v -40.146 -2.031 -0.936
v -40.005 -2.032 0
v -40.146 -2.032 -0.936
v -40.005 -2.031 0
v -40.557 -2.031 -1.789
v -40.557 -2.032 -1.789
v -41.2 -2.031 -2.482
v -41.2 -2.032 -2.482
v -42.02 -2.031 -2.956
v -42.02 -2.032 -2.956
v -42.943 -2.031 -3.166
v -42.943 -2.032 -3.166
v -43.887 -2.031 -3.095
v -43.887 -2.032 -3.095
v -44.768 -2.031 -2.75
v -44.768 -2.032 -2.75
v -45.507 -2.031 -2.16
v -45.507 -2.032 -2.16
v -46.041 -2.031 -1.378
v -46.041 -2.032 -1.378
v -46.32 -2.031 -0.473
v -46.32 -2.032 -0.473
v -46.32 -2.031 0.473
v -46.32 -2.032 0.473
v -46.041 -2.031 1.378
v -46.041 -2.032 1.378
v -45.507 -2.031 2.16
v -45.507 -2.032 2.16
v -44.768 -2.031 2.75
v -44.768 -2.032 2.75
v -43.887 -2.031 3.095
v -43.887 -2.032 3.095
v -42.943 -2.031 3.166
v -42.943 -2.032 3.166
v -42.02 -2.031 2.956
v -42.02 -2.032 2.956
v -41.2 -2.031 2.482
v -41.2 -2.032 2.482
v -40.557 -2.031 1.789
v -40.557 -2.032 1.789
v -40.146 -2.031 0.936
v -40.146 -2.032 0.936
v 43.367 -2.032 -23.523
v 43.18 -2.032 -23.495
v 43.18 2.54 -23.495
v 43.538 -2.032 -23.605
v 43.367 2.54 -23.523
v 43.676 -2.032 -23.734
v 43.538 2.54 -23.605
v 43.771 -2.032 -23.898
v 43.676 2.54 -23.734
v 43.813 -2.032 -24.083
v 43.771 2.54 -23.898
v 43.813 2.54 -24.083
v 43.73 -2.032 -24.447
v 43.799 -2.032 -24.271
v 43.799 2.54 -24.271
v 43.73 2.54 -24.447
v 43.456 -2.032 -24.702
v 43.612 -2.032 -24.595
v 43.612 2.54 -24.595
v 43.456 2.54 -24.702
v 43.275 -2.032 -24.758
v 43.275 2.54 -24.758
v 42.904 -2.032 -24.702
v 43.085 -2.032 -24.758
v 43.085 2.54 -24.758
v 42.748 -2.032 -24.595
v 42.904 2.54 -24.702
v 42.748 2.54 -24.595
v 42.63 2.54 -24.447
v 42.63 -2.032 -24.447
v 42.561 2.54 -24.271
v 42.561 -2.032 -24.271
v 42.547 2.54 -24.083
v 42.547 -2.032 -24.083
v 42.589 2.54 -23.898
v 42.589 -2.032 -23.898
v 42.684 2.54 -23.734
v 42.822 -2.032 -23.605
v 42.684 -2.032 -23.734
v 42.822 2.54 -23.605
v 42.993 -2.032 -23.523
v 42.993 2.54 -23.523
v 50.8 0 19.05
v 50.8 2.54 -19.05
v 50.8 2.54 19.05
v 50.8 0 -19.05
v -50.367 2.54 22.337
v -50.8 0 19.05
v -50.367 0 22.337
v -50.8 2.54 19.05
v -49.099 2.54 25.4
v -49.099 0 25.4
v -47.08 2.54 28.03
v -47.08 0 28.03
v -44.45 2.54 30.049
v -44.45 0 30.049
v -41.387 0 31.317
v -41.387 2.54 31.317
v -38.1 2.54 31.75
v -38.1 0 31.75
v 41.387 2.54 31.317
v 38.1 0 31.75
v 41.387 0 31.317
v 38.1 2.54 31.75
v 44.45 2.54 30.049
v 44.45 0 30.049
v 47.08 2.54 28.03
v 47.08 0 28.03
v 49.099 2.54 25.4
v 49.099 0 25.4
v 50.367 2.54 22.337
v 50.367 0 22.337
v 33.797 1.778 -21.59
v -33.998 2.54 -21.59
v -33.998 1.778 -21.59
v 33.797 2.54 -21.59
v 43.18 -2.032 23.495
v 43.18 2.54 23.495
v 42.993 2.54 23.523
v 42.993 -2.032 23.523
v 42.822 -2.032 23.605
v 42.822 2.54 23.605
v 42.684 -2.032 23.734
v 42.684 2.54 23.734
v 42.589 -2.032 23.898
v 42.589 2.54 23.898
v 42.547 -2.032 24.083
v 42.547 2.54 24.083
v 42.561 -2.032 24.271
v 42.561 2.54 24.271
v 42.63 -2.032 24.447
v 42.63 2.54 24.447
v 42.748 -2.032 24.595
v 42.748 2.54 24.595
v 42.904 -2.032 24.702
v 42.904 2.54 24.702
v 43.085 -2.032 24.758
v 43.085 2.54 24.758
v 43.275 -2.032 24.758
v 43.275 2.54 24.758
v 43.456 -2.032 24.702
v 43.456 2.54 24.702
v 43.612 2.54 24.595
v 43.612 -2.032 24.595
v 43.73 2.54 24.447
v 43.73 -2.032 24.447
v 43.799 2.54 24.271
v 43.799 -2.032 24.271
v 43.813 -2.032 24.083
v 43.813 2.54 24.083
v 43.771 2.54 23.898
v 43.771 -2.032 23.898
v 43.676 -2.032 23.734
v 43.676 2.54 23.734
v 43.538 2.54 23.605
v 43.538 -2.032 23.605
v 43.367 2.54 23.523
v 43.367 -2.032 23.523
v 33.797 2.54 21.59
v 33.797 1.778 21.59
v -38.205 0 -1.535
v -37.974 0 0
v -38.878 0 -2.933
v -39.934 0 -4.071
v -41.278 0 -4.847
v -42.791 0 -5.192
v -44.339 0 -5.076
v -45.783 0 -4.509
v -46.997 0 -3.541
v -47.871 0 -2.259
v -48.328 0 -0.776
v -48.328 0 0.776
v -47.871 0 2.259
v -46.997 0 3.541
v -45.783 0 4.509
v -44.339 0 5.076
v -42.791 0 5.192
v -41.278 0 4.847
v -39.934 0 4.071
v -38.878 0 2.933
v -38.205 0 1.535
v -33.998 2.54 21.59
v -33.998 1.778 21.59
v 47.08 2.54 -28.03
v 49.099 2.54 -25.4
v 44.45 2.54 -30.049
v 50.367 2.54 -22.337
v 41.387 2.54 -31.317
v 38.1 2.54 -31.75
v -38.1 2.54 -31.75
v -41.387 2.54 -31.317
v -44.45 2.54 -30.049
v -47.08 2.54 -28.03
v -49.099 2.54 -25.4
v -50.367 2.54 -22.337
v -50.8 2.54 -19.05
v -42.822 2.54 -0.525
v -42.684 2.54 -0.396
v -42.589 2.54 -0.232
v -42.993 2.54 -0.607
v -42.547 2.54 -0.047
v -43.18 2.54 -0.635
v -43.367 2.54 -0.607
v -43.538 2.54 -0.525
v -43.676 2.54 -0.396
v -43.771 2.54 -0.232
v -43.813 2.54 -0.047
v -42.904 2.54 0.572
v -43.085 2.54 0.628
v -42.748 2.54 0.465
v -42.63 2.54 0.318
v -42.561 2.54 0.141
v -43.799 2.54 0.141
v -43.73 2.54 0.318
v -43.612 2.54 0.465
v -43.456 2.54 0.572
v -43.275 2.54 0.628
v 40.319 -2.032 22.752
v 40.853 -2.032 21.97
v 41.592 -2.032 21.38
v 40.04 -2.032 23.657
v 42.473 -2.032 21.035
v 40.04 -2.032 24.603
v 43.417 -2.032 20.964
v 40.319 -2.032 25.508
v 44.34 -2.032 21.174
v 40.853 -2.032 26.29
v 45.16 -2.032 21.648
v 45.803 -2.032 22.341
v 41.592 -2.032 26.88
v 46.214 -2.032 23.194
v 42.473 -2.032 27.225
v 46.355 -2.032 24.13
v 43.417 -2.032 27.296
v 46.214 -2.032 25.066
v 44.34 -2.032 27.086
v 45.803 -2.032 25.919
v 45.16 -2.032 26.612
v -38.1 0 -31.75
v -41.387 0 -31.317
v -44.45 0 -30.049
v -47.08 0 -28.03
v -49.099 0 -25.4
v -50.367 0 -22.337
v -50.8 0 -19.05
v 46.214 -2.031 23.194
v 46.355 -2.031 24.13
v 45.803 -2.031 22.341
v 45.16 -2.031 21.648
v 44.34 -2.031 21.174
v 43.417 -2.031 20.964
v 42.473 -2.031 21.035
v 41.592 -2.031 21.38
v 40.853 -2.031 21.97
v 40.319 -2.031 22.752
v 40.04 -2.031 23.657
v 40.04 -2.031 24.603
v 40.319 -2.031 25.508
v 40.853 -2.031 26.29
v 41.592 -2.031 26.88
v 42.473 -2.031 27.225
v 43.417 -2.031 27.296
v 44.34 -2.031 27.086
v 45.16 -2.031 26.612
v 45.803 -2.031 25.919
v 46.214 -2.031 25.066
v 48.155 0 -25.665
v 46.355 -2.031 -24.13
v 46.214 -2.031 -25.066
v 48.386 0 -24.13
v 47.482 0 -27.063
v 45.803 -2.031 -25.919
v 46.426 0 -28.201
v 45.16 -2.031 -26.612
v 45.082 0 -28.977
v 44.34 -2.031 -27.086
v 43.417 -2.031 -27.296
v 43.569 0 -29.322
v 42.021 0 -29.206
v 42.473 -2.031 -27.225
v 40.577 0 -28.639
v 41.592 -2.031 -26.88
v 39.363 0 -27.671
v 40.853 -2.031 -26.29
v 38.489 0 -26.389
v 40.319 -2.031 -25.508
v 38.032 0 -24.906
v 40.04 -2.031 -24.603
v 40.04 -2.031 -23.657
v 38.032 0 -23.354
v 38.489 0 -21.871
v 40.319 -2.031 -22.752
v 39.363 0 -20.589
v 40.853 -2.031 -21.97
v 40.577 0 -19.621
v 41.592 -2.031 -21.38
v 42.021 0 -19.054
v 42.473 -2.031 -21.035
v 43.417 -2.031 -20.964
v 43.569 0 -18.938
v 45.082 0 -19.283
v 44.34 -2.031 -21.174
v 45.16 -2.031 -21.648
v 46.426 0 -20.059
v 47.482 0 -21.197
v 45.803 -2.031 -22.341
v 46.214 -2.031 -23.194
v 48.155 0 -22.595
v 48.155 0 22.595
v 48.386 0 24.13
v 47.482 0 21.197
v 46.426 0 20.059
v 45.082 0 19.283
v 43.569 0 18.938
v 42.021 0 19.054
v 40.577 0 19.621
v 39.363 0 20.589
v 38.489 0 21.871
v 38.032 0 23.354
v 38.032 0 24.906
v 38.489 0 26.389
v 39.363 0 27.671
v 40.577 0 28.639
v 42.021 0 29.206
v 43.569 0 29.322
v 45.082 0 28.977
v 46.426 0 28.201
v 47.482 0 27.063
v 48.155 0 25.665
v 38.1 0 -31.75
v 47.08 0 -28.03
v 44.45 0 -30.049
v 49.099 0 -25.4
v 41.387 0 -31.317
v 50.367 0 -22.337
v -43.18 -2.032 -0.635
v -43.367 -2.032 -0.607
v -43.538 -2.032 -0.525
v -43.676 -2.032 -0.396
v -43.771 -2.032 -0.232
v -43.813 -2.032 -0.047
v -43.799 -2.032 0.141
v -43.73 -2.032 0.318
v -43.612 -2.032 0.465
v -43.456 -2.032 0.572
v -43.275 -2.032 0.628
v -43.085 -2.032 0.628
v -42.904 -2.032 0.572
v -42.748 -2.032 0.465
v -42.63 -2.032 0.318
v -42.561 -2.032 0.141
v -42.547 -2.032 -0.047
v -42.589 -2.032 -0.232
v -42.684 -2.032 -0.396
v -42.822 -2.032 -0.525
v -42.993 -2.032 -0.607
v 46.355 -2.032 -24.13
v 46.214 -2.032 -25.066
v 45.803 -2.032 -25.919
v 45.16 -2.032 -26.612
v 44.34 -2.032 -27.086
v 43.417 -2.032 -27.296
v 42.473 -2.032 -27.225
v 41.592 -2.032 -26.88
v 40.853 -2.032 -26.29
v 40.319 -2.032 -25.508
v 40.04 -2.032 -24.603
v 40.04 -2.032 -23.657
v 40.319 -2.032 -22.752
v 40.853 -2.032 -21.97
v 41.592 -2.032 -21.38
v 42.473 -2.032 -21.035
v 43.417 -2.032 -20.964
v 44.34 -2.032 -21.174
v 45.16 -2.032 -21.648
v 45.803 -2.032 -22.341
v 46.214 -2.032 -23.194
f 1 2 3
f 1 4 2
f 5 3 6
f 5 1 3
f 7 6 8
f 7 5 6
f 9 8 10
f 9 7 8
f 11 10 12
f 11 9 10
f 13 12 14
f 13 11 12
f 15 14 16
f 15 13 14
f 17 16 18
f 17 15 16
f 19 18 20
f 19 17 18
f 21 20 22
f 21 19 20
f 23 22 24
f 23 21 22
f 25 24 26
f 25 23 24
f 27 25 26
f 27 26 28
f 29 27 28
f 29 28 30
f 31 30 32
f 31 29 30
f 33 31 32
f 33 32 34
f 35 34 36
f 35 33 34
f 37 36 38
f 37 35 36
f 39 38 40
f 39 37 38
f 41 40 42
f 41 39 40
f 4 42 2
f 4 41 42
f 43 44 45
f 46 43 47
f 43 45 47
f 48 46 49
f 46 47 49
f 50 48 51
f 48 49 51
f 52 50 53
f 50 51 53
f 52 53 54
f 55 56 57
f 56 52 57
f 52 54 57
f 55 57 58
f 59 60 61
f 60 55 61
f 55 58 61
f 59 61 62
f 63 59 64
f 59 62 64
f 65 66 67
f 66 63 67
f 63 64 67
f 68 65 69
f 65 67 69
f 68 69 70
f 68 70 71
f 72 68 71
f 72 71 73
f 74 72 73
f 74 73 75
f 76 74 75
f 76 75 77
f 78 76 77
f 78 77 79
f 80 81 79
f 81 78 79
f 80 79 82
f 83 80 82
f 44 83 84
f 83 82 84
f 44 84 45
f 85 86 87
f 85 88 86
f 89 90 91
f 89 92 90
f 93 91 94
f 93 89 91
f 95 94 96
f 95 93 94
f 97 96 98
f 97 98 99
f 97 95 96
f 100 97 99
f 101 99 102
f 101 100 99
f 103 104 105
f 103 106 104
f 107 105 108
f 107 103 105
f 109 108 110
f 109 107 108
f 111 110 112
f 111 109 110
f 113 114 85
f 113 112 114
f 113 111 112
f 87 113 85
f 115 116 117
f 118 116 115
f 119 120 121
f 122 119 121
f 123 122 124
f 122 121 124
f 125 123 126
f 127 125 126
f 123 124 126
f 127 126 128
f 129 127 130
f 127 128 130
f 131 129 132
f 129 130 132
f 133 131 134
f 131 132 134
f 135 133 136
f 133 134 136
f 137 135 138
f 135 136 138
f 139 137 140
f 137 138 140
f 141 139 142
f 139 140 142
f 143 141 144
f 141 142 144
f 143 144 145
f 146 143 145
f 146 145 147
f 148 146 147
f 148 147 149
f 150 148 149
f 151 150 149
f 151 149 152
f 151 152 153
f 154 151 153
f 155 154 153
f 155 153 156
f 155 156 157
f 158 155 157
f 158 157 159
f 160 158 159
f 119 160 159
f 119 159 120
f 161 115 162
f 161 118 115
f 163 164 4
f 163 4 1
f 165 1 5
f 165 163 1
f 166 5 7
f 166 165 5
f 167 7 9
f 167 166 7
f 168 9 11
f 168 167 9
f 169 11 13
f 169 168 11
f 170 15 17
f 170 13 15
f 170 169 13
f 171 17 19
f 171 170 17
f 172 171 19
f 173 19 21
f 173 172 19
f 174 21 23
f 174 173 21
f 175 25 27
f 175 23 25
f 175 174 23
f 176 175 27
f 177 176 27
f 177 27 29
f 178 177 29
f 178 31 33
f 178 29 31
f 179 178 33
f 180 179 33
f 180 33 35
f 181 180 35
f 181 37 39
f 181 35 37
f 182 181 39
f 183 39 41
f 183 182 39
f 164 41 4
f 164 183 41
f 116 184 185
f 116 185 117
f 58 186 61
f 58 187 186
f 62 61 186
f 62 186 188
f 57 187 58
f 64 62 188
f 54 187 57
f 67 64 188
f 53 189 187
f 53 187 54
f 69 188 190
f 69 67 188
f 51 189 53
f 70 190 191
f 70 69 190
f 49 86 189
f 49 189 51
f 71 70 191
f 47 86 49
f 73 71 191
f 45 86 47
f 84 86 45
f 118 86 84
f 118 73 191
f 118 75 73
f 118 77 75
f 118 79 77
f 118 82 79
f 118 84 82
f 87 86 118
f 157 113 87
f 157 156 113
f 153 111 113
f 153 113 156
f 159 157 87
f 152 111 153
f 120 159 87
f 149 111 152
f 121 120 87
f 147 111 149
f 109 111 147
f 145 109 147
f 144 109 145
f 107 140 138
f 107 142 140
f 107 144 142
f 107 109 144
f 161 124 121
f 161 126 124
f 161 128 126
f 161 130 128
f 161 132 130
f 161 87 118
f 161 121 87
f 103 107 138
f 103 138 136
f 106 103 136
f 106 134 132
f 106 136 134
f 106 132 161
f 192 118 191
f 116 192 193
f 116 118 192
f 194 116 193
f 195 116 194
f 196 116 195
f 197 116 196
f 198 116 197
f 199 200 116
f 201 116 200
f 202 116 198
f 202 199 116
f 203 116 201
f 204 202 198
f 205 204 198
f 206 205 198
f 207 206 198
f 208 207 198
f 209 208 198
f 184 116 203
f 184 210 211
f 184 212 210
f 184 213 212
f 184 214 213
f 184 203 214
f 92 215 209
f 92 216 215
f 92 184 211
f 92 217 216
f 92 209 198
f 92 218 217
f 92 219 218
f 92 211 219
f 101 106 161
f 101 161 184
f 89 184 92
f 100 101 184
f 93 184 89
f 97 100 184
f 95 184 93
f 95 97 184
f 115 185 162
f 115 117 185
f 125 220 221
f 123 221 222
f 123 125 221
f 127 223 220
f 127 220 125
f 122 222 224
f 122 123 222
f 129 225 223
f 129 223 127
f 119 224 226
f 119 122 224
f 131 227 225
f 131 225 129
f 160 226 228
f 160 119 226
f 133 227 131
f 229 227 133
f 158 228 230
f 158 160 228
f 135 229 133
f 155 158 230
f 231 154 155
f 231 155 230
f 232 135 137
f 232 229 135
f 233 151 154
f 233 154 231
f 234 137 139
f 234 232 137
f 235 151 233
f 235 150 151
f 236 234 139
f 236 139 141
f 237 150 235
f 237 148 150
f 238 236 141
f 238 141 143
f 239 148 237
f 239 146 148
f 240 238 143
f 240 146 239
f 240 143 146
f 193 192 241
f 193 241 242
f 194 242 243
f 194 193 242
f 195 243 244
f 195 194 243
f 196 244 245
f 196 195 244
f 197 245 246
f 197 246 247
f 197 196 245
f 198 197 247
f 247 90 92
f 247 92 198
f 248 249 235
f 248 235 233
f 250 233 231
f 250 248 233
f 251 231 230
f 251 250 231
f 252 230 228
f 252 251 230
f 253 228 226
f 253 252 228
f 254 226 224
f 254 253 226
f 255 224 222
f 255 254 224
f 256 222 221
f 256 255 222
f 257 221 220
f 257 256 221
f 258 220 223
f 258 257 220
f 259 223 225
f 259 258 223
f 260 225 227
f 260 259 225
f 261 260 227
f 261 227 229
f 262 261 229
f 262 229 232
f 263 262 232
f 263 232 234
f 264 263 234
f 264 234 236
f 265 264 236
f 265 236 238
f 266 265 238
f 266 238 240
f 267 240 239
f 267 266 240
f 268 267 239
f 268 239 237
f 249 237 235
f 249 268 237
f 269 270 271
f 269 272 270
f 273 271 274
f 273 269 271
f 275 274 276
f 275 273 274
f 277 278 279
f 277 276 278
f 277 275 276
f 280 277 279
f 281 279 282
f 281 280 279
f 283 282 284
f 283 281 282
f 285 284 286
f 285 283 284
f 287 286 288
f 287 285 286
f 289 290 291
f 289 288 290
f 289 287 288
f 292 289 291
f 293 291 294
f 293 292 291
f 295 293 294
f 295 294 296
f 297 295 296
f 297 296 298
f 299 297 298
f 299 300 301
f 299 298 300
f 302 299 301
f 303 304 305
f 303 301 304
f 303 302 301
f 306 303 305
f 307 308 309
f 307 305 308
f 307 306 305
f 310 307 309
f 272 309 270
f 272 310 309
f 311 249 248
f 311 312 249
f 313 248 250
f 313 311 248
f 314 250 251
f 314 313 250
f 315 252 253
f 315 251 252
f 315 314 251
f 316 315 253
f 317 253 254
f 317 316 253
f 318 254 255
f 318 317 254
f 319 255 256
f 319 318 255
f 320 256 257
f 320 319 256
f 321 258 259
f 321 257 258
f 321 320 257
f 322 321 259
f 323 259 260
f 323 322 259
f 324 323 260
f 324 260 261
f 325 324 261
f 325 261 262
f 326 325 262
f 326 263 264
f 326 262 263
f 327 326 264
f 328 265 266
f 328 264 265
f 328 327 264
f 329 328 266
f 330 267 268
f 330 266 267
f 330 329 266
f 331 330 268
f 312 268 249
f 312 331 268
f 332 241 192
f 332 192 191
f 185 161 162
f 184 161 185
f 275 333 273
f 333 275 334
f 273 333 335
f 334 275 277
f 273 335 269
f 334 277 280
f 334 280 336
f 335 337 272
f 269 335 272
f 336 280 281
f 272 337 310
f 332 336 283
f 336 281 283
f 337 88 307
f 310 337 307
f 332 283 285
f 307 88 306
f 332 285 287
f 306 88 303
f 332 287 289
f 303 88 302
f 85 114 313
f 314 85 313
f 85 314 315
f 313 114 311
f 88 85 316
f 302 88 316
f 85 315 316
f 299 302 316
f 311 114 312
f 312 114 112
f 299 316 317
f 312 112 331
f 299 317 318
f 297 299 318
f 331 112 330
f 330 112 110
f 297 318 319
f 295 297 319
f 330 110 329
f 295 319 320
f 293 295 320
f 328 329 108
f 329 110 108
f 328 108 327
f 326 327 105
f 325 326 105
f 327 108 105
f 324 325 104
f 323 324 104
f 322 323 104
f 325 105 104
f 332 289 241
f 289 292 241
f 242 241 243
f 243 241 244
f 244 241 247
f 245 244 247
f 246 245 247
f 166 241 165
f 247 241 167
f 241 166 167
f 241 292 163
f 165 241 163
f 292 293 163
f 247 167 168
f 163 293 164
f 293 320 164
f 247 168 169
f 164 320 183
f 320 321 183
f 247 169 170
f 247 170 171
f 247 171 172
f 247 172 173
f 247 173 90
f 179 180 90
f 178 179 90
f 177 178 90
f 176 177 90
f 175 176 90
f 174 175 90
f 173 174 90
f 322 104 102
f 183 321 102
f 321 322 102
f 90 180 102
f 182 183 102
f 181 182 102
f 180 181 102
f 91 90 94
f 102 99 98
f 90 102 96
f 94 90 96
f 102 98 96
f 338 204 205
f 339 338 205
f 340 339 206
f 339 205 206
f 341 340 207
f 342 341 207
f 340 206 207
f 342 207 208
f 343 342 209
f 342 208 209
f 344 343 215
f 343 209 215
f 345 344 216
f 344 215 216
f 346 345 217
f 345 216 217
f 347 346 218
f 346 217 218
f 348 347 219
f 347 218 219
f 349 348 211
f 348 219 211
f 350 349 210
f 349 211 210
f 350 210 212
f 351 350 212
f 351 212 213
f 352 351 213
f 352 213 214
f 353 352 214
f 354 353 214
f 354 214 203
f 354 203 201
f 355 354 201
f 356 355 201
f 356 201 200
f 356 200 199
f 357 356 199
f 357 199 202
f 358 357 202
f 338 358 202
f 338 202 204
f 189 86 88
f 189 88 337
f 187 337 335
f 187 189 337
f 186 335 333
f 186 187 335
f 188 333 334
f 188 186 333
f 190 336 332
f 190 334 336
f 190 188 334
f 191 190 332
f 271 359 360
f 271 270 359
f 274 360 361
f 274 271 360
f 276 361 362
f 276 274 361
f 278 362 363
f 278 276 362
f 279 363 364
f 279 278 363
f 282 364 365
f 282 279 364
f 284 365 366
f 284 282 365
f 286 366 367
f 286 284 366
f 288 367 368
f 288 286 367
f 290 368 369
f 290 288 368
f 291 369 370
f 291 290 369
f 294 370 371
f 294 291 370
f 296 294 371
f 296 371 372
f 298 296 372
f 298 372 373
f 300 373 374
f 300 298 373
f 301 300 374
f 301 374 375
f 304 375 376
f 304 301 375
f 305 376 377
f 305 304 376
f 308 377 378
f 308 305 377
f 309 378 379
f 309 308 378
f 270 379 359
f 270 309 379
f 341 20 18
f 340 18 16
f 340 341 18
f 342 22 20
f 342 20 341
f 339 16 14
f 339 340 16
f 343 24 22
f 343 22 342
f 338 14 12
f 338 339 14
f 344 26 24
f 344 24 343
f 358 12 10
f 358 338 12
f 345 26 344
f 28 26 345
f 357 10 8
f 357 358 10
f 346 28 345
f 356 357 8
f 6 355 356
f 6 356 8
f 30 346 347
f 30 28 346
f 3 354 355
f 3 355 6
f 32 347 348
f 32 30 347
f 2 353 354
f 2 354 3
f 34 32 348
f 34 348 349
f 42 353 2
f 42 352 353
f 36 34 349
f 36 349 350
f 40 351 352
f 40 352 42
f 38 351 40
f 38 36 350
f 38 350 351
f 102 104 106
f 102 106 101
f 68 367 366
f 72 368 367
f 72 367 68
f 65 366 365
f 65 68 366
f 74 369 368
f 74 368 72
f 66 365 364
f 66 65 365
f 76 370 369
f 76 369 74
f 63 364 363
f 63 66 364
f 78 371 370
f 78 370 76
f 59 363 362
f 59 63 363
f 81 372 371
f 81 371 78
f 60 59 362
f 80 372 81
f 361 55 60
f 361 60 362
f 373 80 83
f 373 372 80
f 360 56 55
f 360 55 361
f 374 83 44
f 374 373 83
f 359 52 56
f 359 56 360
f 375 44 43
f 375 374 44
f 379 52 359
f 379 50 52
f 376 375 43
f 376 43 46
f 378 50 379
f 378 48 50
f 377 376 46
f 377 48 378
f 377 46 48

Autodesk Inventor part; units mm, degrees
ref_plane "YZ Plane" through (0, 0, 0) normal (1, 0, 0) x (0, 1, 0)
ref_plane "XZ Plane" through (0, 0, 0) normal (0, 1, 0) x (-1, 0, 0)
ref_plane "XY Plane" through (0, 0, 0) normal (0, 0, 1) x (1, 0, 0)
sketch "Sketch1" plane through (0, 0, 0) normal (0, 1, 0) x (-1, 0, 0)
  line L0 (50.8, -31.75) -> (-50.8, -31.75)
  line L1 (-50.8, -31.75) -> (-50.8, 31.75)
  line L2 (-50.8, 31.75) -> (50.8, 31.75)
  line L3 (50.8, 31.75) -> (50.8, -31.75)
  line L4 (-57.1863, 0) -> (79.611, 0) construction
  point P0 (0, 0)
  dimension "d0" = 63.5
  dimension "d2" = 101.6
  dimension "d25" = 31.75
  dimension "d36" = 50.8
extrude "Extrusion1" add sketch "Sketch1" along normal blind 2.54
sketch "Sketch2" plane through (0, 0, 0) normal (0, -1, 0) x (1, 0, 0)
  line L0 (-50.8, -31.75) -> (50.8, -31.75) projected
  line L1 (50.8, -31.75) -> (50.8, 31.75) projected
  line L2 (50.8, 31.75) -> (-50.8, 31.75) projected
  line L3 (-50.8, 31.75) -> (-50.8, -31.75) projected
  circle A0 centre (-43.18, 0) radius 3.175
  circle A1 centre (43.18, 24.13) radius 3.175
  circle A2 centre (43.18, -24.13) radius 3.175
  line L4 (43.18, 24.13) -> (43.18, -24.13) construction
  point P0 (0, 0)
  dimension "d5" = 6.35
  dimension "d6" = 7.62
  dimension "d7" = 6.35
  dimension "d8" = 7.62
  dimension "d9" = 7.62
  dimension "d12" = 6.35
  dimension "d13" = 7.62
  dimension "d26" = 31.75
extrude "Extrusion2" add sketch "Sketch2" along normal blind 2.032 contours A0 | A1 | A2
hole "Hole1" at (43.18, -2.032, 24.13) direction (0, 1, 0) diameter 1.27 end through all
mirror "Mirror1" about plane through (0, 0, 0) normal (0, 0, 1) of "Hole1"
sketch "Sketch4" plane through (-43.18, -2.032, 0) normal (0, -1, 0) x (1, 0, 0)
  circle A0 centre (0, 0) radius 3.175 projected
  point P0 (43.18, 0)
hole "Hole2" at (-43.18, -2.032, 0) direction (0, 1, 0) diameter 1.27 end through all
sketch "Sketch5" plane through (0, 2.54, 0) normal (0, 1, 0) x (1, 0, 0)
  line L0 (-33.9981, 21.59) -> (33.797, 21.59)
  line L1 (33.797, 21.59) -> (33.797, -21.59)
  line L2 (33.797, -21.59) -> (-33.9981, -21.59)
  line L3 (-33.9981, -21.59) -> (-33.9981, 21.59)
  point P0 (0, 0)
extrude "Extrusion3" cut sketch "Sketch5" against normal blind 0.762
fillet "Fillet1" radius 12.7 4 edges at (-50.8, 1.27, 31.75) (50.8, 1.27, 31.75) (50.8, 1.27, -31.75) (-50.8, 1.27, -31.75)
chamfer "Chamfer1" distance 2.032 angle 45 3 edges at (40.005, 0, -24.13) (40.005, 0, 24.13) (-46.355, 0, 0)
equation "\"d6\" = d13"
equation "\"d8\" = d13"
properties part number "sensor_board_base"
